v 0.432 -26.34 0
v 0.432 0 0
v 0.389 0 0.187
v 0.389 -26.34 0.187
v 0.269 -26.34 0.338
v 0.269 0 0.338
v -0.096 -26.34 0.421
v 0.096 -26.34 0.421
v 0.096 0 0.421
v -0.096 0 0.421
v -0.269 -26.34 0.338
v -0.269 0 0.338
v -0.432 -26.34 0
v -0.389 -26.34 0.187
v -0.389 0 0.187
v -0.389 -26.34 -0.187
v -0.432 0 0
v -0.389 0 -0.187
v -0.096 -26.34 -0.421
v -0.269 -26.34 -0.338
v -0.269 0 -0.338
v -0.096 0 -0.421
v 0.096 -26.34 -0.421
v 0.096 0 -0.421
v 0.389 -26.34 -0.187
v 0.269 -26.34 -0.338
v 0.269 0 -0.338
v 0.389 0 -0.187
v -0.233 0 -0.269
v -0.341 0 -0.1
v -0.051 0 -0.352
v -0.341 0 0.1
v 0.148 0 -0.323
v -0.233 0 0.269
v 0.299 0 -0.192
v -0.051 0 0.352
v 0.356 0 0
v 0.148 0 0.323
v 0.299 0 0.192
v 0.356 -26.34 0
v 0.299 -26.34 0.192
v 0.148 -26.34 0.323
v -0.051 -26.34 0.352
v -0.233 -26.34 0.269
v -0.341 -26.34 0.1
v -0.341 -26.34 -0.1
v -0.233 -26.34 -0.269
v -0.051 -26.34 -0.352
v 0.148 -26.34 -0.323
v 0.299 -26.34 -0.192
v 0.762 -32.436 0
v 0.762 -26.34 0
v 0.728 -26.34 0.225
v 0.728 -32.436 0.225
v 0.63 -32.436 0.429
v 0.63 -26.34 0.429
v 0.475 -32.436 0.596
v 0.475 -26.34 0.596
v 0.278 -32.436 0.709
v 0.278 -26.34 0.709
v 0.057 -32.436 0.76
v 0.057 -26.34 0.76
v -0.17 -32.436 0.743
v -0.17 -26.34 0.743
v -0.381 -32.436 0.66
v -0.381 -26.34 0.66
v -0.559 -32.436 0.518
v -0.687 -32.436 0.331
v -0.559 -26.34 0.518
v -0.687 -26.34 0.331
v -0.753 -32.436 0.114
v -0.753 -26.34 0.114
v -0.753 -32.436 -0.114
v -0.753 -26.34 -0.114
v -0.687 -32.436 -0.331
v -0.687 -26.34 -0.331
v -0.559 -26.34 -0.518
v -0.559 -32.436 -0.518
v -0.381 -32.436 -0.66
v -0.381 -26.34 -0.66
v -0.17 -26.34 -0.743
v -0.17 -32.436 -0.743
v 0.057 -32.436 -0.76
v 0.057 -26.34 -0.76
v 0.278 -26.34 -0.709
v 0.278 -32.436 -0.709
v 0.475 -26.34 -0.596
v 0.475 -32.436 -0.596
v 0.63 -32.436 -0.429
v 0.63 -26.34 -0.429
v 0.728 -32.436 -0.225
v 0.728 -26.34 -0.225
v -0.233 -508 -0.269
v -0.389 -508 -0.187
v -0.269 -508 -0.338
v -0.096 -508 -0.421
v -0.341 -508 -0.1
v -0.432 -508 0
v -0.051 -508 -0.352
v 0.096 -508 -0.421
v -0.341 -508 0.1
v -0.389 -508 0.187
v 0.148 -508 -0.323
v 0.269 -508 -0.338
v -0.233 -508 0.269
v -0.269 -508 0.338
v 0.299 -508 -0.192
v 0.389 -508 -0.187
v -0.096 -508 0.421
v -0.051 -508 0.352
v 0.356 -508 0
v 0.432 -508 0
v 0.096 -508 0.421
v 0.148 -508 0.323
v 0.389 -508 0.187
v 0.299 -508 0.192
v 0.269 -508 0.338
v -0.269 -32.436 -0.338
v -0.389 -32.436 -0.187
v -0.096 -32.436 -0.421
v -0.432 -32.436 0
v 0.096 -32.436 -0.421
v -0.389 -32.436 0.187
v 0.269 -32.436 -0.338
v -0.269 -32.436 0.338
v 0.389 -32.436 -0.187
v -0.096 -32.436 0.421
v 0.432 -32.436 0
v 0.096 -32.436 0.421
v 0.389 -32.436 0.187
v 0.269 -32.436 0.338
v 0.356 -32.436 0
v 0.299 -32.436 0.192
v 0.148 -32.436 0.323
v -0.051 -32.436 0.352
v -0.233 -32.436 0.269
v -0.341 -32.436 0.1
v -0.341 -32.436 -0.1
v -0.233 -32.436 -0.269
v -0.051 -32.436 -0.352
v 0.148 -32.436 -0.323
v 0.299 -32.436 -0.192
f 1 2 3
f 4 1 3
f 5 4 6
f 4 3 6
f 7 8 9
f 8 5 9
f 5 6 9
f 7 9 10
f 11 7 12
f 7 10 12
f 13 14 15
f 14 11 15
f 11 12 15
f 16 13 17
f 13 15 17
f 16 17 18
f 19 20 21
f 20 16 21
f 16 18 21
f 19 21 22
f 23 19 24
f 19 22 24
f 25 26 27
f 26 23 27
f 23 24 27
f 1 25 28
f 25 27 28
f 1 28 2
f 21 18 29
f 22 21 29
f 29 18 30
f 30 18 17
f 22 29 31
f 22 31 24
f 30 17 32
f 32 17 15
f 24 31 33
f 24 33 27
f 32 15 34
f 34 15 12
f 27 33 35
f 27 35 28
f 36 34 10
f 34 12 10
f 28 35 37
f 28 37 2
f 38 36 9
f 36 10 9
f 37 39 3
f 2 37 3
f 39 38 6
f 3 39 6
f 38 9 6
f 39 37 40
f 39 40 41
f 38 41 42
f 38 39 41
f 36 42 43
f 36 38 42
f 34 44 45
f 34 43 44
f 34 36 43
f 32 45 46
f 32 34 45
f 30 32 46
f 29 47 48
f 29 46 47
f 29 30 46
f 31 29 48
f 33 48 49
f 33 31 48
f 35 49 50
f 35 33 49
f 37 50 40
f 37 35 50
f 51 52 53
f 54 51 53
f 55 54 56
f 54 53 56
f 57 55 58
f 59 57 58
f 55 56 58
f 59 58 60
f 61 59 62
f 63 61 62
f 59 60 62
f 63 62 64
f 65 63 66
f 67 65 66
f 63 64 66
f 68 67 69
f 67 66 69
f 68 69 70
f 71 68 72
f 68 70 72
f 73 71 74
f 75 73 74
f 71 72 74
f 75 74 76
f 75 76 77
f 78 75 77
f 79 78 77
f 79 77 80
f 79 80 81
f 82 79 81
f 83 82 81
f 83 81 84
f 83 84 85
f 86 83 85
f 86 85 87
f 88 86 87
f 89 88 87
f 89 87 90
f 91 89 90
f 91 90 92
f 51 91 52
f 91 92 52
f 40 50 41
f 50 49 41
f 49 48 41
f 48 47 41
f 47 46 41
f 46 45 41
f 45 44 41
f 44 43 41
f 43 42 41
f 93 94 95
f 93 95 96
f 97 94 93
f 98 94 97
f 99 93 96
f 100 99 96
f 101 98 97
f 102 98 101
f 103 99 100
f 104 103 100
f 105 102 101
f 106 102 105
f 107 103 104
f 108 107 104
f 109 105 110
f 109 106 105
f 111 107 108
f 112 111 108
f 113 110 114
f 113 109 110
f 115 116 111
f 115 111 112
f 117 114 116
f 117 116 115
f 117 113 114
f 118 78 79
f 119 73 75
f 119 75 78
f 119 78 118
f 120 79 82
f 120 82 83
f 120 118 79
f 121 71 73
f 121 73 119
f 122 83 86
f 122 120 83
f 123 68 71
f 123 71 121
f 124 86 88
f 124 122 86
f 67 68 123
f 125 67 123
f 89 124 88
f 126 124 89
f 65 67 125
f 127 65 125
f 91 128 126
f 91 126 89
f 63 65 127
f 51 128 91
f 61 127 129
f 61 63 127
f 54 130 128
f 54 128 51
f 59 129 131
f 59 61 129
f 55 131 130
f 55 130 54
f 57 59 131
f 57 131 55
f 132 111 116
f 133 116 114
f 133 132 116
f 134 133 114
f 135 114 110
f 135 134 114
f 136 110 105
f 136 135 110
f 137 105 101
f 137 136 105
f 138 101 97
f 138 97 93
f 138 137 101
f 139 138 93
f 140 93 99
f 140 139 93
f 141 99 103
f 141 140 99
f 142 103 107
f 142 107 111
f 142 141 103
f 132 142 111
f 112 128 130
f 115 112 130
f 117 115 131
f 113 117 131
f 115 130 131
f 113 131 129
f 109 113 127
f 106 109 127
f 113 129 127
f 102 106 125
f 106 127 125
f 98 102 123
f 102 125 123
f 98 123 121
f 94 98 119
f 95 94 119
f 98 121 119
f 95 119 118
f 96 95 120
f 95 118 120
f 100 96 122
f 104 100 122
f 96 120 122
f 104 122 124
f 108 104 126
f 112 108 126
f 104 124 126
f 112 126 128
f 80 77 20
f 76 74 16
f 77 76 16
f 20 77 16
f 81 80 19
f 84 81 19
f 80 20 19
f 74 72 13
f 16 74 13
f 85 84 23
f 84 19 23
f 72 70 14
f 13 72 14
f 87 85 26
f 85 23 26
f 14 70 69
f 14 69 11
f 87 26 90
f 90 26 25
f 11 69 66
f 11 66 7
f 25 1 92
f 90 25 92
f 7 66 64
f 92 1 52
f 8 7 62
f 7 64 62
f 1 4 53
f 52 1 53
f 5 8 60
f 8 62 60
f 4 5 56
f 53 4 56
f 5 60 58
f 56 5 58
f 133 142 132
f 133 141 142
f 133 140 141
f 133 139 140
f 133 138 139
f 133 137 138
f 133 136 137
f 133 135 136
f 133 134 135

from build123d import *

# Parameters (mm, degrees)
F0_R     = 0.4318
F0_R_2   = 0.3556
F1_DEPTH = 508
F3_R     = 0.762
F4_DEPTH = 6.096


with BuildPart() as f1:
    # F0 (on Front) → F1 (new body)
    with BuildSketch(Plane.XZ):
        Circle(F0_R)
        Circle(F0_R_2, mode=Mode.SUBTRACT)
    extrude(amount=F1_DEPTH)

    # F3 (on offset) → F4 (join)
    with BuildSketch(Plane.XZ.offset(26.3398)):
        Circle(F3_R)
    extrude(amount=F4_DEPTH)


solid = f1.part
